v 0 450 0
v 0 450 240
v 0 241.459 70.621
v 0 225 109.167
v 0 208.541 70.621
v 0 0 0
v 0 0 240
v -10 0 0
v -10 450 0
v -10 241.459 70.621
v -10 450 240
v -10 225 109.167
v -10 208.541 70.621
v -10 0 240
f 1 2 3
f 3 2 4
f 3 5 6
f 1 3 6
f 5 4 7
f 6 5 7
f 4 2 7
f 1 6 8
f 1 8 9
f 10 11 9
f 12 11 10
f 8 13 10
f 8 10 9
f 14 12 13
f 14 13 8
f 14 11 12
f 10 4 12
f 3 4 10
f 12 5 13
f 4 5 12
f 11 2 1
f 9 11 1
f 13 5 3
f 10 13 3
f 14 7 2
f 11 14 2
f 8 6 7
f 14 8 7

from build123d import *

# Parameters (mm, degrees)
PAD_DEPTH    = 10
POCKET_DEPTH = 10.001


with BuildPart() as part:
    # Sketch → Pad (new body)
    with BuildSketch(Plane.YZ):
        Polygon((0, 0), (0, 240), (450, 240), (450, 0), (225, 0), align=None)
    extrude(amount=-PAD_DEPTH)

    # Sketch001 → Pocket (cut, through all)
    with BuildSketch(Plane.YZ):
        Polygon((225, 70.62109), (208.541263, 70.62109), (225, 109.167255), (241.458737, 70.62109), align=None)
    extrude(amount=-POCKET_DEPTH, mode=Mode.SUBTRACT)


solid = part.part
